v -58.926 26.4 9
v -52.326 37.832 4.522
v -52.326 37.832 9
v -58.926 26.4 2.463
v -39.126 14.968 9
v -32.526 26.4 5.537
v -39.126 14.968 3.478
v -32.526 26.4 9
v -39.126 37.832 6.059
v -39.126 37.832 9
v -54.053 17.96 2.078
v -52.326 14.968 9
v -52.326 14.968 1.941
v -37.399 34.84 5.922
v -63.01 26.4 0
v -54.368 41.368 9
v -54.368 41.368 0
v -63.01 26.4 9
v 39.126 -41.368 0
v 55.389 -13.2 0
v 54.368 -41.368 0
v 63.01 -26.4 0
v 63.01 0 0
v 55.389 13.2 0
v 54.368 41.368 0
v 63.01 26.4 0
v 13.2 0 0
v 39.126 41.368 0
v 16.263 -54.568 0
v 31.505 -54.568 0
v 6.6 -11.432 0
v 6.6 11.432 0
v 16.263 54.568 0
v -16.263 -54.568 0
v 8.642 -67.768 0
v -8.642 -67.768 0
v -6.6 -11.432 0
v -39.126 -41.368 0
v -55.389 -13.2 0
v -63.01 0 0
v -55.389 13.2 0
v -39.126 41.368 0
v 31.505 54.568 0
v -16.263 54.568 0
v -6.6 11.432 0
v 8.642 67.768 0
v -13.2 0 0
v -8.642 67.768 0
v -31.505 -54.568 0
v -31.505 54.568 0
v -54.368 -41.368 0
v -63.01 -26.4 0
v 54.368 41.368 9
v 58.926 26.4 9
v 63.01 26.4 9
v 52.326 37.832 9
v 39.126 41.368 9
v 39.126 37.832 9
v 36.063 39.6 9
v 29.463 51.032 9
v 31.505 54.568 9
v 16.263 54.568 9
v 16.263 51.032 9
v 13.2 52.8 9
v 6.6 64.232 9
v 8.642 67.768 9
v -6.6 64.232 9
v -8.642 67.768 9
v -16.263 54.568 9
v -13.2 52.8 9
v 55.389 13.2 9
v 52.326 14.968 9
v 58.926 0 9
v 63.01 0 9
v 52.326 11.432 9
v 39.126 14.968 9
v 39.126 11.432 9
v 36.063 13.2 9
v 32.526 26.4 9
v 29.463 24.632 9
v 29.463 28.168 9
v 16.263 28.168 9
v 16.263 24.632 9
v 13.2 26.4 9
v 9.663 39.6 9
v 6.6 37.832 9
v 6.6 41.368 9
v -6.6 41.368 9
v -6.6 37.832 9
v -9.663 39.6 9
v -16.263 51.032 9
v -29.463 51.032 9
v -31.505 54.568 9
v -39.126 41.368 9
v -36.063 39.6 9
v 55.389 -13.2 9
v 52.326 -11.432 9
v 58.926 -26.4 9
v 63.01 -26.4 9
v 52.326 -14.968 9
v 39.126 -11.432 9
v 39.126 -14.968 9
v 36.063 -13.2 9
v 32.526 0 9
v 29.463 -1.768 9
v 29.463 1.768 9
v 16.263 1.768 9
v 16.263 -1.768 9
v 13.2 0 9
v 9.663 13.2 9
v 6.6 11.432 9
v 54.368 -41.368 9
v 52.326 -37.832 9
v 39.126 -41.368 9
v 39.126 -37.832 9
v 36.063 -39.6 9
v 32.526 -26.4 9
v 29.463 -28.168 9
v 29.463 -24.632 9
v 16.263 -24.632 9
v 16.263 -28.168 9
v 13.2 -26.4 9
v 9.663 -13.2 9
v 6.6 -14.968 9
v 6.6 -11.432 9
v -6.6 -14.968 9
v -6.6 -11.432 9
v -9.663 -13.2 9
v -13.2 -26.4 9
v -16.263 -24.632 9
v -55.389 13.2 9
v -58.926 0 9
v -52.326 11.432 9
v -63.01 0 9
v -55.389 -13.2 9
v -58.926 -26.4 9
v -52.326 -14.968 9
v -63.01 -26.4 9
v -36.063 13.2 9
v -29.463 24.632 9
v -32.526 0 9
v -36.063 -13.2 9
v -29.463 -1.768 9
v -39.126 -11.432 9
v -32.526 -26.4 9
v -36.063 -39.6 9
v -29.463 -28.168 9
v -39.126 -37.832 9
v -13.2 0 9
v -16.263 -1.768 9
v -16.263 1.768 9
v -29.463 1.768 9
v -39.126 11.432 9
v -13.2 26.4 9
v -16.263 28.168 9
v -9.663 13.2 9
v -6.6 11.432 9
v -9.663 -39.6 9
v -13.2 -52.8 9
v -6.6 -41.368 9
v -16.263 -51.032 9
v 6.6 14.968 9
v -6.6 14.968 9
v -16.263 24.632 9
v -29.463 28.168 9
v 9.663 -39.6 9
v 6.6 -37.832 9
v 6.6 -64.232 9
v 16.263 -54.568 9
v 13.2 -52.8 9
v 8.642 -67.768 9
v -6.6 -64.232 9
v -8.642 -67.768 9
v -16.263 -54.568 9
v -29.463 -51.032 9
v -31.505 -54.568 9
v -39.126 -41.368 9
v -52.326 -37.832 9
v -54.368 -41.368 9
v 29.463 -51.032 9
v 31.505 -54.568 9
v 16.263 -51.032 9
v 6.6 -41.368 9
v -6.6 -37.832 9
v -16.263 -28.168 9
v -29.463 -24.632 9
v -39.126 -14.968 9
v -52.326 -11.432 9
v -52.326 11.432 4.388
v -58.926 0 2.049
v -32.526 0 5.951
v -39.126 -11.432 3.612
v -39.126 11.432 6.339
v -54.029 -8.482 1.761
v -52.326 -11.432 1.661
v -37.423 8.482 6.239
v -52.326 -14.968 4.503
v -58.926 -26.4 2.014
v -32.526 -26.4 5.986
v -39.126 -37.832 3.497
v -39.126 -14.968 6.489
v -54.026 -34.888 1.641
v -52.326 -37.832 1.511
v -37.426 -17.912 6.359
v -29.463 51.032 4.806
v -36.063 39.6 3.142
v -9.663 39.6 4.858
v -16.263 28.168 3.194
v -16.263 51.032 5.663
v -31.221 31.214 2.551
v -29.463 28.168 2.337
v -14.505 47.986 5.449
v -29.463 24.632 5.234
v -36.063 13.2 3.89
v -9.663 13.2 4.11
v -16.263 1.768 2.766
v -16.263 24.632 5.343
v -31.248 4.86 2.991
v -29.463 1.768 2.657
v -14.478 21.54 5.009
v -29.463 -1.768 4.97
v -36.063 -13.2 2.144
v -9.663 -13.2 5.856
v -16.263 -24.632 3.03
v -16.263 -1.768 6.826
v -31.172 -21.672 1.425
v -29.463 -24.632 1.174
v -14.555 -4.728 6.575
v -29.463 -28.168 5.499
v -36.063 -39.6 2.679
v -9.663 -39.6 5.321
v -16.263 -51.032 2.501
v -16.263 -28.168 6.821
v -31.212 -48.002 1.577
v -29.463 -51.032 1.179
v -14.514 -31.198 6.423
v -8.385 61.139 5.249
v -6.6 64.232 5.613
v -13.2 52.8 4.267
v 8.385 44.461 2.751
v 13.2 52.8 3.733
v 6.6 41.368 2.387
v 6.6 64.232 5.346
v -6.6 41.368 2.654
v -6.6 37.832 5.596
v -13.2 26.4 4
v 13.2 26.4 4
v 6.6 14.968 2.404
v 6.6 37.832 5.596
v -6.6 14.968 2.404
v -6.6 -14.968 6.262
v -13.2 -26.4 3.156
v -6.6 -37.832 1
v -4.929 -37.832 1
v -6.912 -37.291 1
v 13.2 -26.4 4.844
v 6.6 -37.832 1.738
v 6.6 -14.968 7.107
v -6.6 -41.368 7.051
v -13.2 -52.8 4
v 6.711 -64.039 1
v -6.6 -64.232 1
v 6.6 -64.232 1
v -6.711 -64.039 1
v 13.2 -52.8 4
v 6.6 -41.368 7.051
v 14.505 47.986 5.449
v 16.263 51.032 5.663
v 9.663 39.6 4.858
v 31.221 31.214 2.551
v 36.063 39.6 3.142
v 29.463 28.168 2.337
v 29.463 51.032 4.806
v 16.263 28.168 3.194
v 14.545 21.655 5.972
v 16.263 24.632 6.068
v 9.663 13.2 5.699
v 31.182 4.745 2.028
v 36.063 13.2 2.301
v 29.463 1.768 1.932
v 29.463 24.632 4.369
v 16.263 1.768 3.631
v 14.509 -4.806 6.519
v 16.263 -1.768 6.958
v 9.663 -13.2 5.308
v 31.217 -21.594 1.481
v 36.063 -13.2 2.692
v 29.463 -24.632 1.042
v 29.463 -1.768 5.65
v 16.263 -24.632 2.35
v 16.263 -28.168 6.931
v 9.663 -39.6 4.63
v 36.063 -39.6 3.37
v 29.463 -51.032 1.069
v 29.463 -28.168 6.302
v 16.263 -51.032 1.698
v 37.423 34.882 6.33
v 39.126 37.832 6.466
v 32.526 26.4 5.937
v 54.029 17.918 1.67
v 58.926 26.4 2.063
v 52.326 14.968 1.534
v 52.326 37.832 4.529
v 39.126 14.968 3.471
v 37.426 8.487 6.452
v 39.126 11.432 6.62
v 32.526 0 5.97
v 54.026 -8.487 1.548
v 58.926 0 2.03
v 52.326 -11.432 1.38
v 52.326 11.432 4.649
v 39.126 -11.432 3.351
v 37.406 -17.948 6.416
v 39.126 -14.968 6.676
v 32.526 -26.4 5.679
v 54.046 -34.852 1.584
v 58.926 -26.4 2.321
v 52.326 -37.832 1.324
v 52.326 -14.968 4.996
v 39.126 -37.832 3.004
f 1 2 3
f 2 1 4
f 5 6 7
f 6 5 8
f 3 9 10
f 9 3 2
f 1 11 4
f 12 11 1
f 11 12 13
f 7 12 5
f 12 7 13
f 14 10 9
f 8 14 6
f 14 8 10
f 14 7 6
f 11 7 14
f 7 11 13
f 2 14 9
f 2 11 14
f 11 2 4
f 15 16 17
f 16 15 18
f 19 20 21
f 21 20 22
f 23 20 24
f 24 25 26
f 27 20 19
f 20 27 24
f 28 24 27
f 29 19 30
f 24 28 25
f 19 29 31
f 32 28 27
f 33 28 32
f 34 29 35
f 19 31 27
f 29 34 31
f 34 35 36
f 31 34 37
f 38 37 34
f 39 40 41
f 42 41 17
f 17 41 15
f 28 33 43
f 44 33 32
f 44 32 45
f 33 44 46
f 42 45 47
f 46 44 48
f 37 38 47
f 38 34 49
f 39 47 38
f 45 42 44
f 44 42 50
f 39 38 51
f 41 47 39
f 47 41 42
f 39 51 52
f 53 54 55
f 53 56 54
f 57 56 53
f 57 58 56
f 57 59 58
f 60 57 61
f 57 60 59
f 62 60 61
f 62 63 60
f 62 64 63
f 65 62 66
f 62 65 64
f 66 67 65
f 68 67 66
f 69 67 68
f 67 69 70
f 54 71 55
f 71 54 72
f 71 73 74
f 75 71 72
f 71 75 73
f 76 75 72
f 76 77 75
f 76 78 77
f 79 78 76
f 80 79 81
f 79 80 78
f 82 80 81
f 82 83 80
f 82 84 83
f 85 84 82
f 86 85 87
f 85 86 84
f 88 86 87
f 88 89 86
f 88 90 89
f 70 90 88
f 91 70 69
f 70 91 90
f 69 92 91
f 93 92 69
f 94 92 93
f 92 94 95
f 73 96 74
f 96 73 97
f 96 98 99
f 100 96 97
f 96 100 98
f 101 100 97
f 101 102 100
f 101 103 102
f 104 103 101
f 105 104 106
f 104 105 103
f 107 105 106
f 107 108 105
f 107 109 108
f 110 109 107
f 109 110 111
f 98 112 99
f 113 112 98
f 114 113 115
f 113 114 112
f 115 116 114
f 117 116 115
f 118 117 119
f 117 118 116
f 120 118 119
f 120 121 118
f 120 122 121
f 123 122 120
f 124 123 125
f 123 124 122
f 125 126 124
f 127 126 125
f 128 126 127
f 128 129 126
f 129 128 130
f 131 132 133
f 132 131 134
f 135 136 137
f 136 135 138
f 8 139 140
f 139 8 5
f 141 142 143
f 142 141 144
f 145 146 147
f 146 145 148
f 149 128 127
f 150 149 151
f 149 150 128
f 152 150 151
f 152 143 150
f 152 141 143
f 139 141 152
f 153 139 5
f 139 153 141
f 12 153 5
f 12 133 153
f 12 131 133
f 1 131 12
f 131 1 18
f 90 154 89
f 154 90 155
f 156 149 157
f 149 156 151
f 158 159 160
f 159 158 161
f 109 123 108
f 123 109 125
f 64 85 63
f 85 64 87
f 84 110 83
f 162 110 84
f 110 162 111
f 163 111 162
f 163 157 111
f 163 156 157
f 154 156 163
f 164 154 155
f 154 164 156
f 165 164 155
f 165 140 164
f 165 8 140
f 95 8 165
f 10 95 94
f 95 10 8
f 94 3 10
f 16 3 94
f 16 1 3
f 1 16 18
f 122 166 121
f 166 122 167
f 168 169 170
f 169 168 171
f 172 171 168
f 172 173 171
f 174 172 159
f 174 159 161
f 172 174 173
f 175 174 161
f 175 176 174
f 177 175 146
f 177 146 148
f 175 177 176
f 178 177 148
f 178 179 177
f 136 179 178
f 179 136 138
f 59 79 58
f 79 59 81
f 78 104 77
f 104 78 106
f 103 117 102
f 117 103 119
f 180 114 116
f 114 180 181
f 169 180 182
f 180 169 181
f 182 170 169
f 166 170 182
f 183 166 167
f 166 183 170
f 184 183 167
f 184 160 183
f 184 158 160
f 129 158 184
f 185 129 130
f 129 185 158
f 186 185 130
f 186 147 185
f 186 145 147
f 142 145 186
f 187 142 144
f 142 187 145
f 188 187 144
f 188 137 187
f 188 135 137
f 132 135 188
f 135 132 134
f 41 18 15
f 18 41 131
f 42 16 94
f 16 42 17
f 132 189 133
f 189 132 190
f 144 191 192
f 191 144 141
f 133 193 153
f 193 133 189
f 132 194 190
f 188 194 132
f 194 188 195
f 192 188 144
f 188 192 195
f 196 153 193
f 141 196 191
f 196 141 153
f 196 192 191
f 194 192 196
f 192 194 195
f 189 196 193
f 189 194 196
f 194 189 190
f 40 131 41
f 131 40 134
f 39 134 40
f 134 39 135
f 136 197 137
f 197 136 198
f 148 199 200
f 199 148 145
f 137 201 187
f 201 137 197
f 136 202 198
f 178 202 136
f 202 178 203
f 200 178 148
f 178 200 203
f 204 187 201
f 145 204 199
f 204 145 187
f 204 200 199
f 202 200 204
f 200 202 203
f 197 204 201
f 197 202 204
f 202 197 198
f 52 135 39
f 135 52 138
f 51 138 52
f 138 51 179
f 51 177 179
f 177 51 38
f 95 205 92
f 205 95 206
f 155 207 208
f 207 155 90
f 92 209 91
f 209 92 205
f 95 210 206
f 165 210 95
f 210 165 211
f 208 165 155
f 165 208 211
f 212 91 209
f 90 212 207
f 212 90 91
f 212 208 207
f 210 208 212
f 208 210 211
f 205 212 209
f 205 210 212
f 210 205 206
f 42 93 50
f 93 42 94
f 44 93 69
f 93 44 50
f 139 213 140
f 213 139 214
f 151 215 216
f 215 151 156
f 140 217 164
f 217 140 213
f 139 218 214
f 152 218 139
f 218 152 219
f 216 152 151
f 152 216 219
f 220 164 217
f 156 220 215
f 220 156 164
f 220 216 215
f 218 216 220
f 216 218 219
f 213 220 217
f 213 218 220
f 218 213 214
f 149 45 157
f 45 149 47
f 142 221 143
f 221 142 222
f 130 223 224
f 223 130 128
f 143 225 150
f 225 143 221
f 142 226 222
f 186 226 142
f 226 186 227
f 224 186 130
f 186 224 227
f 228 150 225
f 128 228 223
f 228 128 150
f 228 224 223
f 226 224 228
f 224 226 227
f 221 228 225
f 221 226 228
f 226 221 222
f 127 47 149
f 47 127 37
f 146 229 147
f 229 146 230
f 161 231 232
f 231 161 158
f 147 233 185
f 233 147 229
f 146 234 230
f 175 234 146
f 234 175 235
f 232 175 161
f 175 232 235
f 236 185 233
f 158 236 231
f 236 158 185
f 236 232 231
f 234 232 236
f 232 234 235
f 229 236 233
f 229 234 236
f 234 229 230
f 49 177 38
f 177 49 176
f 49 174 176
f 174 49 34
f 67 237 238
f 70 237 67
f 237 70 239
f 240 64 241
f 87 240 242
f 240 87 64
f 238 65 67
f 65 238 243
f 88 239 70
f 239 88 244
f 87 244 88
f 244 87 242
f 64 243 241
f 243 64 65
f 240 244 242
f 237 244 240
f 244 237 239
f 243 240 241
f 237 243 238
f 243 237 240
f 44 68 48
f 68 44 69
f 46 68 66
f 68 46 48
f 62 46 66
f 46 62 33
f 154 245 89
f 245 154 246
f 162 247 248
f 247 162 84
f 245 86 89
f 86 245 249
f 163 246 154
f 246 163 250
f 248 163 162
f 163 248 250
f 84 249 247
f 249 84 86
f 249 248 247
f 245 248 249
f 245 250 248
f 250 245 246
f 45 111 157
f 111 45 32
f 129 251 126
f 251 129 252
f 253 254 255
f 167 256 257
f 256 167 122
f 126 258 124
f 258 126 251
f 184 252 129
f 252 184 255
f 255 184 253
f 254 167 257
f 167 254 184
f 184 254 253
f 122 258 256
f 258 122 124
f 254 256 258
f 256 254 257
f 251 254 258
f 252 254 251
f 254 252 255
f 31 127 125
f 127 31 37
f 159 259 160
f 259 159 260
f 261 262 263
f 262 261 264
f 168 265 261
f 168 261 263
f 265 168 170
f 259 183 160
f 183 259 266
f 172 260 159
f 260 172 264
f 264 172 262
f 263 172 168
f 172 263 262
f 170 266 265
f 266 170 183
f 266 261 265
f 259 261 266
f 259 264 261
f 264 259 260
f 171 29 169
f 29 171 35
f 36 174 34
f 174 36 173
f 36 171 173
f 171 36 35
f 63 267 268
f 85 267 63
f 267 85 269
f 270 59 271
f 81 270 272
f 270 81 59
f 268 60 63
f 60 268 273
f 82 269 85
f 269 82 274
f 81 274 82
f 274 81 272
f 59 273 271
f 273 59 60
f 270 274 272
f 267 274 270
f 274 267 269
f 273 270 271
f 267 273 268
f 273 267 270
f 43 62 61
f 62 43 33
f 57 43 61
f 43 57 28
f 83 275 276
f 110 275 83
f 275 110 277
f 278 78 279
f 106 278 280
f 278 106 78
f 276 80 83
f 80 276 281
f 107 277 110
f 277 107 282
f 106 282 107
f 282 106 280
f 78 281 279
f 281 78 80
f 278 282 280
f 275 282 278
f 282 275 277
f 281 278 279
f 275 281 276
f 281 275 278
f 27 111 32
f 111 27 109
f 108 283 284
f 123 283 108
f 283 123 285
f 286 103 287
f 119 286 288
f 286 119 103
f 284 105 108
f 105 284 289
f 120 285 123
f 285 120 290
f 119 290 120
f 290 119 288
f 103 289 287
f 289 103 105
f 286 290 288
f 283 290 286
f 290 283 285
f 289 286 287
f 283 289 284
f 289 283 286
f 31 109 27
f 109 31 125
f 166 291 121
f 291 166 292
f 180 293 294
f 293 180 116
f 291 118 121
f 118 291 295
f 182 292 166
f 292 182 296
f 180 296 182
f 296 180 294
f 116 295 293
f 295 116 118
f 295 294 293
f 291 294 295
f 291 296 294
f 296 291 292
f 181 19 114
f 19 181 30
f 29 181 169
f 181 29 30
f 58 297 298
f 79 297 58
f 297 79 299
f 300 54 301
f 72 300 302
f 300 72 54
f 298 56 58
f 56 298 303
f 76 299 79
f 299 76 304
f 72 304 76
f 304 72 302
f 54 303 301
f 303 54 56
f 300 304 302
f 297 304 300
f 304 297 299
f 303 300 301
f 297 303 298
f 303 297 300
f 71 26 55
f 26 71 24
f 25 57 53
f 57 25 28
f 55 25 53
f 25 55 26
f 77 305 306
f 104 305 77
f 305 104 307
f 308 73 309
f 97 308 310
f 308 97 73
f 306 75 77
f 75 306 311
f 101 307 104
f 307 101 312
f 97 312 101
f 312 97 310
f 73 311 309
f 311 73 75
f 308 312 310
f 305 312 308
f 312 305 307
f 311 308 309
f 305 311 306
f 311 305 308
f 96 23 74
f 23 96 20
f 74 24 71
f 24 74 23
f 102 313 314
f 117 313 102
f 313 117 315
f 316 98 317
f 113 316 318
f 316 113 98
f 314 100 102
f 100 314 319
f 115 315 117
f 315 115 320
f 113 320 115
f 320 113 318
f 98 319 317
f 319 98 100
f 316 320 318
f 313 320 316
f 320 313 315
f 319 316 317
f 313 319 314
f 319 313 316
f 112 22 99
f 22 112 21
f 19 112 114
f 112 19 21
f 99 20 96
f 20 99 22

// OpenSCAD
/**
 * Anniversary present for my wife.
 *
 * Reflects the sun to show a heart.
 */

/*
Setup

                    Sun
                 .
              .
m          .
i       .
r    .
r .
o    .
r       .
           .
              .
             image

After figuring out the positions of the heart and hex pixels,
plugged the points into the Hungarian Algorithm to find the
minimum correspondence, in order to make the rays as parallel
as possible. Here's the Python code for doing that:

```
import numpy as np
from scipy.optimize import linear_sum_assignment

# Fill in these arrays
heart_positions = np.array(...)
hex_positions = np.array(...)d

cost_matrix = np.linalg.norm(heart_positions[None, :, :] - hex_positions[:, None, :], ord=2, axis=2)
row_ind, col_ind = linear_sum_assignment(cost_matrix)

print(heart_positions[col_ind].tolist())
print(hex_positions[row_ind].tolist())

print(np.linalg.norm(heart_positions - hex_positions, axis=1))
print(np.linalg.norm(heart_positions[col_ind] - hex_positions[row_ind], axis=1))
```

You can verify that the total norm is lower for the new positions.
*/

// Angle of the sun in the sky at the moment when I proposed to Chi.
// Determined using this tool:
// https://www.sunearthtools.com/dp/tools/pos_sun.php?lang=en
sun_angle = 19.66;

// One inch in millimeters, plus a small padding.
one_inch = 25.4 + 1;

// Horizontal distance between mirror and image.
image_distance = 12 * 4 * one_inch;

// Vertical height of mirror.
mirror_height = 12 * 3 * one_inch;

// Distance to the sun (very large).
sun_distance = 12 * 8 * one_inch;

/*
Heart layout

    --- y axis --->

  0 1 2 3 4 5 6 7 8 9
0      x       x
1   x     x x     x
2  x       x       x
3  x               x
4    x           x
5      x       x
6        x   x
7          x
*/

heart_positions = [
    [1.0, 1.0],
    [0.5, 2.0],
    [0.75, 3.0],
    [2.5, 0.25],
    [4.0, 1.0],
    [1.5, 4.0],
    [2.5, 5.0],
    [5.0, 1.0],
    [4.5, 2.0],
    [3.5, 6.0],
    [4.5, 7.0],
    [6.5, 0.25],
    [8.0, 1.0],
    [6.5, 5.0],
    [5.5, 6.0],
    [8.5, 2.0],
    [8.25, 3.0],
    [7.5, 4.0],
];

/*
Hexagonal layout

Coordinates below are (x, y)

   --- y axis --->

  0 1 2 3 4 5 6 7 8
0     x   x   x
1
2   x   x   x   x
3
4 x   x       x   x
5
6   x   x   x   x
7
8     x   x   x
*/

hex_positions = [
    [0, 2],
    [0, 4],
    [0, 6],
    [2, 1],
    [2, 3],
    [2, 5],
    [2, 7],
    [4, 0],
    [4, 2],
    [4, 6],
    [4, 8],
    [6, 1],
    [6, 3],
    [6, 5],
    [6, 7],
    [8, 2],
    [8, 4],
    [8, 6],
];

assert(len(heart_positions) == len(hex_positions), "Invalid positions");

function dim_sum(arr, j, i = 0, sum = 0) =
    i == len(arr) ?
        sum :
        dim_sum(arr, j, i + 1, sum + arr[i][j]);

function dim_mean(arr, j) = dim_sum(arr, j) / len(arr);

function unit_vec(v) = let (nm = norm(v)) [v[0] / nm, v[1] / nm, v[2] / nm];

module rotate_by(v) {
    yaw = -atan2(v[1], v[2]);
    pitch = atan2(v[0], v[2]);
    
    rotate([yaw, pitch, 0])
        rotate([0, 0, 0])
            children();
}

module draw_ray(vec) {
    rotate_by(vec) {
        translate([0, 0, norm(vec)])
            sphere(5);
        linear_extrude(norm(vec))
            circle(2, $fn=6);
    }
}

module pillar(hex_x, hex_y, heart_x, heart_y) {
    sun_x = 0;
    sun_y = sin(sun_angle) * sun_distance;
    sun_z = cos(sun_angle) * sun_distance;

    mirror_x = hex_x;
    mirror_y = hex_y;
    mirror_z = 0;

    img_x = heart_x;
    img_y = -mirror_height;
    img_z = image_distance + heart_y;

    // Gets the vector normal to the surface of the mirror.
    sun_vec_full = [sun_x - mirror_x, sun_y - mirror_y, sun_z - mirror_z];
    img_vec_full = [img_x - mirror_x, img_y - mirror_y, img_z - mirror_z];
    sun_vec = unit_vec(sun_vec_full);
    img_vec = unit_vec(img_vec_full);
    norm_vec = [(sun_vec[0] + img_vec[0]) / 2, (sun_vec[1] + img_vec[1]) / 2, (sun_vec[2] + img_vec[2]) / 2];

    /*
    Draws the rays for visualization purposes (very important for debugging).

    draw_ray(sun_vec_full);
    draw_ray(img_vec_full);
    draw_ray([norm_vec[0] * 200, norm_vec[1] * 200, norm_vec[2] * 200]);
    */

    rad = 0.5 * one_inch;
    rad2 = 0.5 * one_inch / cos(30);
    outer_rad = 2 * (rad2 - rad) + rad;

    difference() {
        linear_extrude(9)
        circle(r=outer_rad, $fn=6);
        translate([0, 0, 1])
            difference() {
                linear_extrude(10)
                    circle(r=rad, $fn=6);
                translate([0, 0, 3]) {
                    rotate_by(norm_vec)
                        translate([-one_inch, -one_inch, -one_inch])
                            cube([one_inch * 2, one_inch * 2, one_inch]);
                }
            }
    }
}

module block(i) {
    hex_center_x = dim_mean(hex_positions, 0);
    hex_center_y = dim_mean(hex_positions, 1);
    heart_center_x = dim_mean(heart_positions, 0);
    heart_center_y = dim_mean(heart_positions, 1);

    hex_x = (hex_positions[i][0] - hex_center_x) * 0.5 * one_inch * cos(30);
    hex_y = (hex_center_y - hex_positions[i][1]) * 0.5 * one_inch;
    heart_x = (heart_positions[i][0] - heart_center_x) * 5.0 * one_inch;
    heart_y = (heart_center_y - heart_positions[i][1]) * 5.0 * one_inch;
    translate([hex_x, hex_y, 0])
        pillar(hex_x, hex_y, heart_x, heart_y);
}

for (i = [0:len(hex_positions) - 1]) block(i);
// block(8);
